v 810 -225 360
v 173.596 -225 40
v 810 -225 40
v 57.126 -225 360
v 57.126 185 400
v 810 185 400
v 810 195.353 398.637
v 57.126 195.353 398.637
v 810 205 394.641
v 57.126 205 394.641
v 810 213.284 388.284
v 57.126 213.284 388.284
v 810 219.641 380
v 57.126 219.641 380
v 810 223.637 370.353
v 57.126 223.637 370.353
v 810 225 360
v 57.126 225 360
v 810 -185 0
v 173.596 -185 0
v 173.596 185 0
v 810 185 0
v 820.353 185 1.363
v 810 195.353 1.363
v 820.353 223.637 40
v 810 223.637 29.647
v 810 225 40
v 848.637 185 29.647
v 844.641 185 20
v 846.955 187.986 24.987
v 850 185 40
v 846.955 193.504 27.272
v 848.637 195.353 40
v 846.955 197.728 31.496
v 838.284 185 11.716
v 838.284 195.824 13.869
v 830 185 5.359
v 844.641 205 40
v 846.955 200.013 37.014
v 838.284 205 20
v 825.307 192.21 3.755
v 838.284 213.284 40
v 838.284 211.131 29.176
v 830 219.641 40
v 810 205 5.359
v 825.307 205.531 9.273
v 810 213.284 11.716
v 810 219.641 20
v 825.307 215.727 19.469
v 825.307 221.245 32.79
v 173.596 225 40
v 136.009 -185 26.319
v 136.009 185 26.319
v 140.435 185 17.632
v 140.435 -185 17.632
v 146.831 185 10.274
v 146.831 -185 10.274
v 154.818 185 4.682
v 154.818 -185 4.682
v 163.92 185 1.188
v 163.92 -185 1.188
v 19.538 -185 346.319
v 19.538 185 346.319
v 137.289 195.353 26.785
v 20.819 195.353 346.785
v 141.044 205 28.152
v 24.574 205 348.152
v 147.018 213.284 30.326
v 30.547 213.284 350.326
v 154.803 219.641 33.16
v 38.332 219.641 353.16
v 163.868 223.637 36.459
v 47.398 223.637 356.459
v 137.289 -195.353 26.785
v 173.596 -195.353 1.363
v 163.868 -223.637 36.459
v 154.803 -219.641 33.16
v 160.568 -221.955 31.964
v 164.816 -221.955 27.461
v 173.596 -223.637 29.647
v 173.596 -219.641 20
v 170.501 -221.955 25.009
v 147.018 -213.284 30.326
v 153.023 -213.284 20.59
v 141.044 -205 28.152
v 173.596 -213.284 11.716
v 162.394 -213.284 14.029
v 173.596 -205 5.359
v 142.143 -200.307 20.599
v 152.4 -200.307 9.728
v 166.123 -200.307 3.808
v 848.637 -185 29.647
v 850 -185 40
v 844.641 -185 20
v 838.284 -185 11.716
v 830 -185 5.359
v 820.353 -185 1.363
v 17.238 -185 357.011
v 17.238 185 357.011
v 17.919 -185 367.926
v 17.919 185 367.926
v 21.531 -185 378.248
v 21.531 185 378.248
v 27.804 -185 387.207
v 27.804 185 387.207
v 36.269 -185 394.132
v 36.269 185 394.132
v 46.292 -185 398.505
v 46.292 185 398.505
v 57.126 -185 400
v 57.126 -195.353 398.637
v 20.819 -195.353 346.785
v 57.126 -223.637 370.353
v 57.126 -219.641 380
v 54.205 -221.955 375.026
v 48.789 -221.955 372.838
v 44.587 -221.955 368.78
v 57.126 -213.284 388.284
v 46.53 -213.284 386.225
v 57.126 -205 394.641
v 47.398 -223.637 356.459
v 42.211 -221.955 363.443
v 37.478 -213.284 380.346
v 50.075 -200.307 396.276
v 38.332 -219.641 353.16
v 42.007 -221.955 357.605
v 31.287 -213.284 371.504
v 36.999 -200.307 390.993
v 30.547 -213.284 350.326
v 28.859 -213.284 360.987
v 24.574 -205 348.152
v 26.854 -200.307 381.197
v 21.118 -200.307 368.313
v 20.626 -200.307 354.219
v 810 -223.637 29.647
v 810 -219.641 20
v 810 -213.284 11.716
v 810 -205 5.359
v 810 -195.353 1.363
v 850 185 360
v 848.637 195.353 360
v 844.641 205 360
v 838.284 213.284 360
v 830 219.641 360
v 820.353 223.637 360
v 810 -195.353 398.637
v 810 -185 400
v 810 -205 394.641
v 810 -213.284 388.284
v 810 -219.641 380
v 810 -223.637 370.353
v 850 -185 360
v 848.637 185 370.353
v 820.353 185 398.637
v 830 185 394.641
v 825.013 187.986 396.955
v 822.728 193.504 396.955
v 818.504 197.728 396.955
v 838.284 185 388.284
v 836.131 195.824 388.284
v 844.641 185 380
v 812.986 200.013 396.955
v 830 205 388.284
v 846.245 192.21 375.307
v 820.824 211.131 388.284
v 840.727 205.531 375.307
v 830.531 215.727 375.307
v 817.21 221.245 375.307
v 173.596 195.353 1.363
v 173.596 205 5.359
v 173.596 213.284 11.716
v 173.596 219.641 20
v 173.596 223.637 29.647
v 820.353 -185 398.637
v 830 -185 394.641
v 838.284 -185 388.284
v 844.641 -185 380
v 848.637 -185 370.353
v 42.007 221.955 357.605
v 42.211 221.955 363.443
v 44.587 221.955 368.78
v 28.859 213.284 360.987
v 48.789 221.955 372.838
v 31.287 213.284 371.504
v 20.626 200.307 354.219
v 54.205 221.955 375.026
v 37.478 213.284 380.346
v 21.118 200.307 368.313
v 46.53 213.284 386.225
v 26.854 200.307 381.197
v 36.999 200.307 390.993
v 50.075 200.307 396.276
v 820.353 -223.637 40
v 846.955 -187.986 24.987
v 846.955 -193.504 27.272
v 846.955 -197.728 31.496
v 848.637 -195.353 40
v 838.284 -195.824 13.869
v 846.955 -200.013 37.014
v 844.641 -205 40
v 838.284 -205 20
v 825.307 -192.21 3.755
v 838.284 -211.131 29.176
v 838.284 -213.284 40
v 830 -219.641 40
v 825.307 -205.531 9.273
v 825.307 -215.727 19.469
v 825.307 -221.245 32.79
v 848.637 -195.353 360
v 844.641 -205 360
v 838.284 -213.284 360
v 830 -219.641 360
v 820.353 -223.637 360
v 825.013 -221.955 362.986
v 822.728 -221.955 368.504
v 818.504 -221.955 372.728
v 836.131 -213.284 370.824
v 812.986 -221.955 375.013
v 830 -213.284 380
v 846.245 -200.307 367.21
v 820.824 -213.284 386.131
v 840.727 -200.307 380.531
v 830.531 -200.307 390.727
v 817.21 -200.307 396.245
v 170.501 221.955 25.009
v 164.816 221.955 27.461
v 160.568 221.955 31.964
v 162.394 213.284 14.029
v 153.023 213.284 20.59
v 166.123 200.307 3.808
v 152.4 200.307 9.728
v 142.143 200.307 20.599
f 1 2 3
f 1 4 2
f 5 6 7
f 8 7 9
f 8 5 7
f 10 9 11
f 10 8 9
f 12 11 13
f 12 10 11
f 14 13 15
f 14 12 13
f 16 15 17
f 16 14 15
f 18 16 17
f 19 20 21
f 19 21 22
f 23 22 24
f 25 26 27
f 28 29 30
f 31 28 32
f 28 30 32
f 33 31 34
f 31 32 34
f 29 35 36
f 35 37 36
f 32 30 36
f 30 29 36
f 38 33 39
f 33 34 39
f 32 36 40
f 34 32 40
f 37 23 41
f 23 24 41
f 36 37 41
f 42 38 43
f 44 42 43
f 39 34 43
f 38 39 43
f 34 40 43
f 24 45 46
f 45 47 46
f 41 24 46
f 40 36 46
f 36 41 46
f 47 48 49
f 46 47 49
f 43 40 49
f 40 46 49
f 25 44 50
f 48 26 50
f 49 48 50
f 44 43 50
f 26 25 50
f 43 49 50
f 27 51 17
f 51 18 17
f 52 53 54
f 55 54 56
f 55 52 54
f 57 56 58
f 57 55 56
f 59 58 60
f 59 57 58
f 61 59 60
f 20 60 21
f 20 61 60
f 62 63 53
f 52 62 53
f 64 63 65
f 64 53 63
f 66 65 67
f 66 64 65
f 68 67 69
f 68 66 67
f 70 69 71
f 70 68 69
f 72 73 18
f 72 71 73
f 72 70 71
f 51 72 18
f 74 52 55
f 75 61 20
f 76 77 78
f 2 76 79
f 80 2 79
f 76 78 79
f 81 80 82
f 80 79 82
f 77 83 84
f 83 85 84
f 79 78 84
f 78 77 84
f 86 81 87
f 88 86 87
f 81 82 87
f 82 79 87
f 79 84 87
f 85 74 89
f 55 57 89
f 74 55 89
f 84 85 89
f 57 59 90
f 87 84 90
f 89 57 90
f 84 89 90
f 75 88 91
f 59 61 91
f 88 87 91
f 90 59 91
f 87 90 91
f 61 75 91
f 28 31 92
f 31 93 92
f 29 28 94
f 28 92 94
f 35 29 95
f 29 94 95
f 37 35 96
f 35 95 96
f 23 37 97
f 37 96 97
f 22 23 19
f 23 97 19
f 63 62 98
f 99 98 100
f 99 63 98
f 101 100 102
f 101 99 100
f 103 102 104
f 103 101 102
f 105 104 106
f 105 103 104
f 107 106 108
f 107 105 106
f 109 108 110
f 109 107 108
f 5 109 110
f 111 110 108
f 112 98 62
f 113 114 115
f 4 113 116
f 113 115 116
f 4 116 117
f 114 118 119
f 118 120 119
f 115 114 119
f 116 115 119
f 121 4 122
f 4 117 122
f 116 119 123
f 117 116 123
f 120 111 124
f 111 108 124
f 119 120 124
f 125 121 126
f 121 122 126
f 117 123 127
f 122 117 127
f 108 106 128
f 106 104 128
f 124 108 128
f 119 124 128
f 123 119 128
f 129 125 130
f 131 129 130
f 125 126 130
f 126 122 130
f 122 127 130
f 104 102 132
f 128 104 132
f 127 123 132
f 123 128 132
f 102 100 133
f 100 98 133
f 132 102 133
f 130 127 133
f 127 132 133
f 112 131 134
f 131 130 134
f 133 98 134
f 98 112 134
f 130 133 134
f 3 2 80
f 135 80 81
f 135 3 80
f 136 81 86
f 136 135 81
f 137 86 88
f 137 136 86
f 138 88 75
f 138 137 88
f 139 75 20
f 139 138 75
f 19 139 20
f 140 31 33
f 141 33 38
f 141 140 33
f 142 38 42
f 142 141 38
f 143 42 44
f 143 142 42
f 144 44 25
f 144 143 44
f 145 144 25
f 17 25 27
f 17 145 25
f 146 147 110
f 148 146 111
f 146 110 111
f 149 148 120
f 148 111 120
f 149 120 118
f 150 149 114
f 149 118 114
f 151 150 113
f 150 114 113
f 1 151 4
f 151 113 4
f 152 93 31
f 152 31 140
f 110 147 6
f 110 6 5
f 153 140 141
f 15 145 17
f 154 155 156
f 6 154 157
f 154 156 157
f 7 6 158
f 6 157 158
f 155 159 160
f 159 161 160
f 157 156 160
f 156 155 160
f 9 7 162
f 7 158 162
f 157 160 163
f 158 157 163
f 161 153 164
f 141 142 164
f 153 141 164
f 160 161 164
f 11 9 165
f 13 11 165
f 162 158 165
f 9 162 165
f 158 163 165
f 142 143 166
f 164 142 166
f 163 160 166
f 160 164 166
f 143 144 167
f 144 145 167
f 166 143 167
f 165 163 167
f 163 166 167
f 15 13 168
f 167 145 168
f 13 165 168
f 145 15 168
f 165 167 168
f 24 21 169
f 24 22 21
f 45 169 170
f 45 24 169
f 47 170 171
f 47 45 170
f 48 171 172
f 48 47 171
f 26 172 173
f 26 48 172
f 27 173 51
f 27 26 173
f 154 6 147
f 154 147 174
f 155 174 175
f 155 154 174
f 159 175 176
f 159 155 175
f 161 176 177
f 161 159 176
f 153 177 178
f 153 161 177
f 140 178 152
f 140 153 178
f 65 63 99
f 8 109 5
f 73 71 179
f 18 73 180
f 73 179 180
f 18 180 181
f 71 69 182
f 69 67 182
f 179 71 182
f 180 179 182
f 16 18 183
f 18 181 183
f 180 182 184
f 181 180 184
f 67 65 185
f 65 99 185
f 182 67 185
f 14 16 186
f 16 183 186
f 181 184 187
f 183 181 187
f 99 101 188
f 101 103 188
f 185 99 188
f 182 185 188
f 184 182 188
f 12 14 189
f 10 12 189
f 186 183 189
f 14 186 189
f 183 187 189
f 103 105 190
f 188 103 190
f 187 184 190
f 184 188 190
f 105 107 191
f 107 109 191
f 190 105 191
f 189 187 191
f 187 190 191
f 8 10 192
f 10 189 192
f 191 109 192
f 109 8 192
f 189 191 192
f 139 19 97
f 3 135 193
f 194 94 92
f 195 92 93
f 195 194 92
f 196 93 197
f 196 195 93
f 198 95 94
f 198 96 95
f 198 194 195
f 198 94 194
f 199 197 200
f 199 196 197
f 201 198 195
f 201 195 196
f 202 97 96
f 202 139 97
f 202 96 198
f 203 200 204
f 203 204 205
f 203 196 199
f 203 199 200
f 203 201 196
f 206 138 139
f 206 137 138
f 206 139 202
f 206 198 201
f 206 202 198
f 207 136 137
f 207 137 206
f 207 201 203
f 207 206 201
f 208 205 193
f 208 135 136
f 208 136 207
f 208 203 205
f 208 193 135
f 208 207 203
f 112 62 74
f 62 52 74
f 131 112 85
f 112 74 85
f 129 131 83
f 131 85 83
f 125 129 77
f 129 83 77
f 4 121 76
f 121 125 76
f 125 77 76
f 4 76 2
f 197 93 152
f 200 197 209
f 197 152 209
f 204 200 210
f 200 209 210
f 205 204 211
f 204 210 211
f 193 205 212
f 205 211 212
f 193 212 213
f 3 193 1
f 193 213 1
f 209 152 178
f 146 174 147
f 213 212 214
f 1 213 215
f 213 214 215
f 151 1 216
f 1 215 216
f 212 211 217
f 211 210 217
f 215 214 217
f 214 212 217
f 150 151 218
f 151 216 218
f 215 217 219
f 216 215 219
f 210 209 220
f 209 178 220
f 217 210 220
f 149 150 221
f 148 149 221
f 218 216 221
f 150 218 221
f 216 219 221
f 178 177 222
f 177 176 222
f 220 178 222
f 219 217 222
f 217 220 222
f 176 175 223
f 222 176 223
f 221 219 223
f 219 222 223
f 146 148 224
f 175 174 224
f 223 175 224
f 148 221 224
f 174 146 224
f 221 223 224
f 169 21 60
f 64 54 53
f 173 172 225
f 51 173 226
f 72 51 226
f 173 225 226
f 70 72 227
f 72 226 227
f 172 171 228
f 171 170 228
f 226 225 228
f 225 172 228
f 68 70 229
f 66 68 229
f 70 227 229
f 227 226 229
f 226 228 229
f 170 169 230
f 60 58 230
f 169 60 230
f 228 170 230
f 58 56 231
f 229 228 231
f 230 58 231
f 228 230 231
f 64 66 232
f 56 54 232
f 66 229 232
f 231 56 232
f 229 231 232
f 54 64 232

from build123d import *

# Parameters (mm, degrees)
F1_DEPTH = 225
F2_R     = 40


with BuildPart() as f1:
    # F0 (on Front) → F1 (new body, symmetric)
    with BuildSketch(Plane.XZ):
        Polygon((0, 400), (145.588094, 0), (850, 0), (850, 400), align=None)
    extrude(amount=F1_DEPTH, both=True)

    # F2
    f2_edges = [f1.edges().sort_by_distance(p)[0] for p in [
        (497.794047, -225, 0),
        (145.588094, 0, 0),
        (497.794047, 225, 0),
        (850, 0, 0),
        (72.794047, -225, 200),
        (850, 225, 200),
        (850, 0, 400),
        (850, -225, 200),
        (425, 225, 400),
        (0, 0, 400),
        (425, -225, 400),
        (72.794047, 225, 200),
    ]]
    fillet(f2_edges, radius=F2_R)


solid = f1.part
